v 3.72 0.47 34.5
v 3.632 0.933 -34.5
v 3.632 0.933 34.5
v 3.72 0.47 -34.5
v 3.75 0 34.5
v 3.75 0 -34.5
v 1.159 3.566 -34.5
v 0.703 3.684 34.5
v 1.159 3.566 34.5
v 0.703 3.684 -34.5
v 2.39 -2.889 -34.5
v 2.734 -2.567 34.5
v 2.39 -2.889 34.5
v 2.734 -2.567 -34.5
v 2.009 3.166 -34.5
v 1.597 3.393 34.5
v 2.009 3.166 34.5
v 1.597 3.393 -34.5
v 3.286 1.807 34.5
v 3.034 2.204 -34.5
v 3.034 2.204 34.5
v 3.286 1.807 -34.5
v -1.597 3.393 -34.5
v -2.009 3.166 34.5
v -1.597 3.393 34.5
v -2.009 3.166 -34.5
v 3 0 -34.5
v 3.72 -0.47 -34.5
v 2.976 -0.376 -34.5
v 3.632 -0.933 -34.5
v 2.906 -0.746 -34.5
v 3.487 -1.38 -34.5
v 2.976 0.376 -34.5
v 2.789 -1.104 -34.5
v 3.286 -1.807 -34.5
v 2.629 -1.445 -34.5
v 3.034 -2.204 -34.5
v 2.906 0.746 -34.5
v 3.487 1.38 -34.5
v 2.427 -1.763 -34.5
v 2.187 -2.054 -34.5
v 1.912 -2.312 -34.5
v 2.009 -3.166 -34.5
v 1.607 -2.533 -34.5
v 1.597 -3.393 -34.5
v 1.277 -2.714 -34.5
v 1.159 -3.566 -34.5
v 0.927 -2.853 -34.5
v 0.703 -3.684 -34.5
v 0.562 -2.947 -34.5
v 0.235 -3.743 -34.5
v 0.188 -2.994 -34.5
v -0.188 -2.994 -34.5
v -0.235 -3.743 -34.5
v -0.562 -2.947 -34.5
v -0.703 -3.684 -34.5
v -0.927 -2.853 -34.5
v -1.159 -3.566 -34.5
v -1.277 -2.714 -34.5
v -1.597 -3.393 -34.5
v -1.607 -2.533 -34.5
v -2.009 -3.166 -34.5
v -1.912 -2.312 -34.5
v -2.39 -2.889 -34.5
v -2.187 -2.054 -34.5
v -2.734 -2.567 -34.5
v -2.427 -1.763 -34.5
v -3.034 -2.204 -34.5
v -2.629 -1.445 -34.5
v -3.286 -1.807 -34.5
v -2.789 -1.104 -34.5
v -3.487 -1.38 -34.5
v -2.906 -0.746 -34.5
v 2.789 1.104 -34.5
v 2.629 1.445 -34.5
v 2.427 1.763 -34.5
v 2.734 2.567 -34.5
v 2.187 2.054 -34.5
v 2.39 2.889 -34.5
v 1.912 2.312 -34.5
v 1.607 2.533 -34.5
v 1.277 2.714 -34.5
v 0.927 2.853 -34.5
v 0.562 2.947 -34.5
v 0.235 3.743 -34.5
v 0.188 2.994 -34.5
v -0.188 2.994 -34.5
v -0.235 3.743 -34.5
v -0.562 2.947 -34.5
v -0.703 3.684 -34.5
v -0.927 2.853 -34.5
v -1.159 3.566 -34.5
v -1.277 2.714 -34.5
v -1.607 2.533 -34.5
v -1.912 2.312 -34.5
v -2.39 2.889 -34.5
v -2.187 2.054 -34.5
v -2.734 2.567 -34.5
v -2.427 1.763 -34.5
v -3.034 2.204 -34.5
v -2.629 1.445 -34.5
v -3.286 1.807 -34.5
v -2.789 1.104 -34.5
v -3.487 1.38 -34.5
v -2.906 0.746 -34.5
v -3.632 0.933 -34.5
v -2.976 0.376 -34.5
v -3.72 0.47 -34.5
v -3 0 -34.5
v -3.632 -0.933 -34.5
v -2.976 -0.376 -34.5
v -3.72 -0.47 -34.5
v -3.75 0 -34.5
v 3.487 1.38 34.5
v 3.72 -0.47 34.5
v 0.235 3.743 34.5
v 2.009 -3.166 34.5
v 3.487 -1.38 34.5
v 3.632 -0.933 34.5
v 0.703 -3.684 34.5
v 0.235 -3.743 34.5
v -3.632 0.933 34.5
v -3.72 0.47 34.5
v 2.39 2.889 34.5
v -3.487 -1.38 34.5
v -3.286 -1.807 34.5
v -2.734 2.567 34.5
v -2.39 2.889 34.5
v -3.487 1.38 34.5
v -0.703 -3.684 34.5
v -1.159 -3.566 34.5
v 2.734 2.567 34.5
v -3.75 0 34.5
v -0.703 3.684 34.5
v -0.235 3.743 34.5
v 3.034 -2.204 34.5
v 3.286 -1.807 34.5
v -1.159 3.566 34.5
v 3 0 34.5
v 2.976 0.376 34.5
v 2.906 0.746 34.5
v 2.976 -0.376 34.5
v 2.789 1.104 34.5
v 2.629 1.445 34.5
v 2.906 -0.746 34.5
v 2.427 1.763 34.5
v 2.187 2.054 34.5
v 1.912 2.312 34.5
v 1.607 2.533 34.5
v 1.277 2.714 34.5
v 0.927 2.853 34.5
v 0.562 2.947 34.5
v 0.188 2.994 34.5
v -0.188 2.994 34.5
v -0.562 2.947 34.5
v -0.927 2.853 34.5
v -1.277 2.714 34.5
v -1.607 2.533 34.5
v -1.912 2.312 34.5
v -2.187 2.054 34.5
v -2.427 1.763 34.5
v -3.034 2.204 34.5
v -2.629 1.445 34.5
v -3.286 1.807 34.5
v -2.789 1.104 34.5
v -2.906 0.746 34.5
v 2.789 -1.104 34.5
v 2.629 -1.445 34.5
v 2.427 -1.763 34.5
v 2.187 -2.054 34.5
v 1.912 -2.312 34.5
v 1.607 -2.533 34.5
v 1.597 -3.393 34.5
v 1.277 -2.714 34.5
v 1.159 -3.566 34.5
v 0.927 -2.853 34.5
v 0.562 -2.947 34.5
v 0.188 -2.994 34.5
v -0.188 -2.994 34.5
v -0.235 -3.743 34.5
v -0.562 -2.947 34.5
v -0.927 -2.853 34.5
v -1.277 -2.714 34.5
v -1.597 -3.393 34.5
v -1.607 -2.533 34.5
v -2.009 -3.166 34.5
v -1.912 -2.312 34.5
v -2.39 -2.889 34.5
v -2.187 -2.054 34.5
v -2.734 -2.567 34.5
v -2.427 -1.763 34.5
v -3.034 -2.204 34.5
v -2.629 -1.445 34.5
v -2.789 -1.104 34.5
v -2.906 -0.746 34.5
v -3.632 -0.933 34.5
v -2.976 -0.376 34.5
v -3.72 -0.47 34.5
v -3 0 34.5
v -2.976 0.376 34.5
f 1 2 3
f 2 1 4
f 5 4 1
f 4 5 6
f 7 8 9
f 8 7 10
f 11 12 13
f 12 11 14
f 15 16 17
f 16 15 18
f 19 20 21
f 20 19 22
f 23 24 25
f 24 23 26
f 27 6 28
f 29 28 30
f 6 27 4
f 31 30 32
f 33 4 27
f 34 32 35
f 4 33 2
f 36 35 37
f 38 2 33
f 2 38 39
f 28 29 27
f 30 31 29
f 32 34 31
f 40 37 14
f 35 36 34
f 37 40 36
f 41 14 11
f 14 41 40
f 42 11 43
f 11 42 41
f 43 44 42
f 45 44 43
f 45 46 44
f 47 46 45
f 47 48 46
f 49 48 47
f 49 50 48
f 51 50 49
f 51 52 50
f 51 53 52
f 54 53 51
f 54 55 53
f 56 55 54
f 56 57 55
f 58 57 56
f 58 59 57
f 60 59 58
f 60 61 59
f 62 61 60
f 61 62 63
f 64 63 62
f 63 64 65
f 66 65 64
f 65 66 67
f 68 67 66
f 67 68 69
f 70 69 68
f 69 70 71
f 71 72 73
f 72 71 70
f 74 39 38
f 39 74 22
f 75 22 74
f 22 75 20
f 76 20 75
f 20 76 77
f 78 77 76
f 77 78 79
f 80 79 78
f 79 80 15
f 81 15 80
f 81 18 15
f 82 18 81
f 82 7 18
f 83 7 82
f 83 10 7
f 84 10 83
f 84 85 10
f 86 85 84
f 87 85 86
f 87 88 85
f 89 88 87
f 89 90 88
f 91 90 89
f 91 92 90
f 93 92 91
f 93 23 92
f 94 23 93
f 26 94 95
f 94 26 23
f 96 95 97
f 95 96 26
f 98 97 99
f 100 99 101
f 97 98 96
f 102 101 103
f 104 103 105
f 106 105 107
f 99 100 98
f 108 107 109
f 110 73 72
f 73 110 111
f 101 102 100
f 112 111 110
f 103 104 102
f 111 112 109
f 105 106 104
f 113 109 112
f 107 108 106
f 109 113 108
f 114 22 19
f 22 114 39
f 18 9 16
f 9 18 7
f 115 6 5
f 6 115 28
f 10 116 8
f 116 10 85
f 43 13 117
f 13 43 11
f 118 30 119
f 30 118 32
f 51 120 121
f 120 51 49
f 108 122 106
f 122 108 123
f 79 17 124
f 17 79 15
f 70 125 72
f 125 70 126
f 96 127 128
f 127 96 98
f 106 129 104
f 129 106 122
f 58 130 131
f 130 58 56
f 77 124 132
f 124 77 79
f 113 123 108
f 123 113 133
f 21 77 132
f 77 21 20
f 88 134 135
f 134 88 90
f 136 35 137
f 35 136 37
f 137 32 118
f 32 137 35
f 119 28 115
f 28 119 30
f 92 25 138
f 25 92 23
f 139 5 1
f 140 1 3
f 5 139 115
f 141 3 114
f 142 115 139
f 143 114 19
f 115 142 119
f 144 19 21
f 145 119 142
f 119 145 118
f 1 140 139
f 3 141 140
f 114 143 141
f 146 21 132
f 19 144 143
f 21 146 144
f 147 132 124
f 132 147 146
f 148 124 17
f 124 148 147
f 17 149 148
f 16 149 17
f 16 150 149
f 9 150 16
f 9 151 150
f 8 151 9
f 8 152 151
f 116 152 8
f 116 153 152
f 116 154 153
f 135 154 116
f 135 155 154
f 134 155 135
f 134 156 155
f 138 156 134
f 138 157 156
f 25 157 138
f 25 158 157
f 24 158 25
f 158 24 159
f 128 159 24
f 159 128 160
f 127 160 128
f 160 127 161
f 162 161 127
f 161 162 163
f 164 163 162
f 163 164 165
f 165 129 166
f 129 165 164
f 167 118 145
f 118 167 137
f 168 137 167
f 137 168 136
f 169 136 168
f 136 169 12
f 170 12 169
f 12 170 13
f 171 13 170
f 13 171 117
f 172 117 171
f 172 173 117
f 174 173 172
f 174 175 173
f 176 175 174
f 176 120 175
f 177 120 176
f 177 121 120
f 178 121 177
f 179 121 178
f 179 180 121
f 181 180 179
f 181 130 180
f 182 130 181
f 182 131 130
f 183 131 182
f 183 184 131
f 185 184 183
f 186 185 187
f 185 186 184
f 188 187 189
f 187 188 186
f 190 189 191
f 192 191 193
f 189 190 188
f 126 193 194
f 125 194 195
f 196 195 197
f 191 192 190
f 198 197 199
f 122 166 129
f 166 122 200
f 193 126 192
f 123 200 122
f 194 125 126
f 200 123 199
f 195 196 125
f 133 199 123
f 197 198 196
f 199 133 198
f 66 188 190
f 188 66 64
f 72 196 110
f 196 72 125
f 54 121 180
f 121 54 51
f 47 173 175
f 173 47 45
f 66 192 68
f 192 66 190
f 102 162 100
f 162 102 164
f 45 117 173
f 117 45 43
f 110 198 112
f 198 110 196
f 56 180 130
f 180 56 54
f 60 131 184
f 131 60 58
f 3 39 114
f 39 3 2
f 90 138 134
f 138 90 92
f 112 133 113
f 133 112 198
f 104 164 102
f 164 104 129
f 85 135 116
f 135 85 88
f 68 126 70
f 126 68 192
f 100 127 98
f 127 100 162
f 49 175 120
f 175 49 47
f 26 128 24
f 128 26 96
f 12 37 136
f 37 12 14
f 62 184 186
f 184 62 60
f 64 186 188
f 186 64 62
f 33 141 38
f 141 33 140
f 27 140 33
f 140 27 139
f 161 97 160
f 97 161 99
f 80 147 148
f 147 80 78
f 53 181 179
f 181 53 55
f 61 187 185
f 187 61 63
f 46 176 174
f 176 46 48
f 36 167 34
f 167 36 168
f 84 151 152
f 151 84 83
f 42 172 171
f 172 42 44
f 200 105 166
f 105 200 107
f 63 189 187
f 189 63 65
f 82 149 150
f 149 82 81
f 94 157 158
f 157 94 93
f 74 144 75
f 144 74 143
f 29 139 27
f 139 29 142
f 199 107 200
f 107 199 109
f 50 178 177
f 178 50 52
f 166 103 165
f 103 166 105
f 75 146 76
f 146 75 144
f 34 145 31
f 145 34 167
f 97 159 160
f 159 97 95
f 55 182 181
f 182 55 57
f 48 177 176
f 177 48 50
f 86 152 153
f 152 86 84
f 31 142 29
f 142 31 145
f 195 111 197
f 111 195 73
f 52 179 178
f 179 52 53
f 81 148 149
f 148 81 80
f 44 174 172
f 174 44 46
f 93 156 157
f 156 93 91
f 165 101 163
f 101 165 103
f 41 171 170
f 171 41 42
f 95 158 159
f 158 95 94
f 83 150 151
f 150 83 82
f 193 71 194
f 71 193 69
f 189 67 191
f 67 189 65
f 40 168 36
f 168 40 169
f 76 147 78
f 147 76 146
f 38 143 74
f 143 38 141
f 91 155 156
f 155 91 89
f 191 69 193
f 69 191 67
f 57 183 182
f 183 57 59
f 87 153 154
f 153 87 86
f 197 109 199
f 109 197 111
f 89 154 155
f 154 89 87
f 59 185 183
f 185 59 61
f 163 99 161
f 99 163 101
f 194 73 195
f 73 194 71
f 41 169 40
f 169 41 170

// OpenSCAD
$fn = 50;


difference() {
	union() {
		translate(v = [0, 0, -34.5000000000]) {
			cylinder(h = 69, r = 3.7500000000);
		}
	}
	union() {
		translate(v = [0, 0, -100.0000000000]) {
			cylinder(h = 200, r = 3.0000000000);
		}
	}
}
